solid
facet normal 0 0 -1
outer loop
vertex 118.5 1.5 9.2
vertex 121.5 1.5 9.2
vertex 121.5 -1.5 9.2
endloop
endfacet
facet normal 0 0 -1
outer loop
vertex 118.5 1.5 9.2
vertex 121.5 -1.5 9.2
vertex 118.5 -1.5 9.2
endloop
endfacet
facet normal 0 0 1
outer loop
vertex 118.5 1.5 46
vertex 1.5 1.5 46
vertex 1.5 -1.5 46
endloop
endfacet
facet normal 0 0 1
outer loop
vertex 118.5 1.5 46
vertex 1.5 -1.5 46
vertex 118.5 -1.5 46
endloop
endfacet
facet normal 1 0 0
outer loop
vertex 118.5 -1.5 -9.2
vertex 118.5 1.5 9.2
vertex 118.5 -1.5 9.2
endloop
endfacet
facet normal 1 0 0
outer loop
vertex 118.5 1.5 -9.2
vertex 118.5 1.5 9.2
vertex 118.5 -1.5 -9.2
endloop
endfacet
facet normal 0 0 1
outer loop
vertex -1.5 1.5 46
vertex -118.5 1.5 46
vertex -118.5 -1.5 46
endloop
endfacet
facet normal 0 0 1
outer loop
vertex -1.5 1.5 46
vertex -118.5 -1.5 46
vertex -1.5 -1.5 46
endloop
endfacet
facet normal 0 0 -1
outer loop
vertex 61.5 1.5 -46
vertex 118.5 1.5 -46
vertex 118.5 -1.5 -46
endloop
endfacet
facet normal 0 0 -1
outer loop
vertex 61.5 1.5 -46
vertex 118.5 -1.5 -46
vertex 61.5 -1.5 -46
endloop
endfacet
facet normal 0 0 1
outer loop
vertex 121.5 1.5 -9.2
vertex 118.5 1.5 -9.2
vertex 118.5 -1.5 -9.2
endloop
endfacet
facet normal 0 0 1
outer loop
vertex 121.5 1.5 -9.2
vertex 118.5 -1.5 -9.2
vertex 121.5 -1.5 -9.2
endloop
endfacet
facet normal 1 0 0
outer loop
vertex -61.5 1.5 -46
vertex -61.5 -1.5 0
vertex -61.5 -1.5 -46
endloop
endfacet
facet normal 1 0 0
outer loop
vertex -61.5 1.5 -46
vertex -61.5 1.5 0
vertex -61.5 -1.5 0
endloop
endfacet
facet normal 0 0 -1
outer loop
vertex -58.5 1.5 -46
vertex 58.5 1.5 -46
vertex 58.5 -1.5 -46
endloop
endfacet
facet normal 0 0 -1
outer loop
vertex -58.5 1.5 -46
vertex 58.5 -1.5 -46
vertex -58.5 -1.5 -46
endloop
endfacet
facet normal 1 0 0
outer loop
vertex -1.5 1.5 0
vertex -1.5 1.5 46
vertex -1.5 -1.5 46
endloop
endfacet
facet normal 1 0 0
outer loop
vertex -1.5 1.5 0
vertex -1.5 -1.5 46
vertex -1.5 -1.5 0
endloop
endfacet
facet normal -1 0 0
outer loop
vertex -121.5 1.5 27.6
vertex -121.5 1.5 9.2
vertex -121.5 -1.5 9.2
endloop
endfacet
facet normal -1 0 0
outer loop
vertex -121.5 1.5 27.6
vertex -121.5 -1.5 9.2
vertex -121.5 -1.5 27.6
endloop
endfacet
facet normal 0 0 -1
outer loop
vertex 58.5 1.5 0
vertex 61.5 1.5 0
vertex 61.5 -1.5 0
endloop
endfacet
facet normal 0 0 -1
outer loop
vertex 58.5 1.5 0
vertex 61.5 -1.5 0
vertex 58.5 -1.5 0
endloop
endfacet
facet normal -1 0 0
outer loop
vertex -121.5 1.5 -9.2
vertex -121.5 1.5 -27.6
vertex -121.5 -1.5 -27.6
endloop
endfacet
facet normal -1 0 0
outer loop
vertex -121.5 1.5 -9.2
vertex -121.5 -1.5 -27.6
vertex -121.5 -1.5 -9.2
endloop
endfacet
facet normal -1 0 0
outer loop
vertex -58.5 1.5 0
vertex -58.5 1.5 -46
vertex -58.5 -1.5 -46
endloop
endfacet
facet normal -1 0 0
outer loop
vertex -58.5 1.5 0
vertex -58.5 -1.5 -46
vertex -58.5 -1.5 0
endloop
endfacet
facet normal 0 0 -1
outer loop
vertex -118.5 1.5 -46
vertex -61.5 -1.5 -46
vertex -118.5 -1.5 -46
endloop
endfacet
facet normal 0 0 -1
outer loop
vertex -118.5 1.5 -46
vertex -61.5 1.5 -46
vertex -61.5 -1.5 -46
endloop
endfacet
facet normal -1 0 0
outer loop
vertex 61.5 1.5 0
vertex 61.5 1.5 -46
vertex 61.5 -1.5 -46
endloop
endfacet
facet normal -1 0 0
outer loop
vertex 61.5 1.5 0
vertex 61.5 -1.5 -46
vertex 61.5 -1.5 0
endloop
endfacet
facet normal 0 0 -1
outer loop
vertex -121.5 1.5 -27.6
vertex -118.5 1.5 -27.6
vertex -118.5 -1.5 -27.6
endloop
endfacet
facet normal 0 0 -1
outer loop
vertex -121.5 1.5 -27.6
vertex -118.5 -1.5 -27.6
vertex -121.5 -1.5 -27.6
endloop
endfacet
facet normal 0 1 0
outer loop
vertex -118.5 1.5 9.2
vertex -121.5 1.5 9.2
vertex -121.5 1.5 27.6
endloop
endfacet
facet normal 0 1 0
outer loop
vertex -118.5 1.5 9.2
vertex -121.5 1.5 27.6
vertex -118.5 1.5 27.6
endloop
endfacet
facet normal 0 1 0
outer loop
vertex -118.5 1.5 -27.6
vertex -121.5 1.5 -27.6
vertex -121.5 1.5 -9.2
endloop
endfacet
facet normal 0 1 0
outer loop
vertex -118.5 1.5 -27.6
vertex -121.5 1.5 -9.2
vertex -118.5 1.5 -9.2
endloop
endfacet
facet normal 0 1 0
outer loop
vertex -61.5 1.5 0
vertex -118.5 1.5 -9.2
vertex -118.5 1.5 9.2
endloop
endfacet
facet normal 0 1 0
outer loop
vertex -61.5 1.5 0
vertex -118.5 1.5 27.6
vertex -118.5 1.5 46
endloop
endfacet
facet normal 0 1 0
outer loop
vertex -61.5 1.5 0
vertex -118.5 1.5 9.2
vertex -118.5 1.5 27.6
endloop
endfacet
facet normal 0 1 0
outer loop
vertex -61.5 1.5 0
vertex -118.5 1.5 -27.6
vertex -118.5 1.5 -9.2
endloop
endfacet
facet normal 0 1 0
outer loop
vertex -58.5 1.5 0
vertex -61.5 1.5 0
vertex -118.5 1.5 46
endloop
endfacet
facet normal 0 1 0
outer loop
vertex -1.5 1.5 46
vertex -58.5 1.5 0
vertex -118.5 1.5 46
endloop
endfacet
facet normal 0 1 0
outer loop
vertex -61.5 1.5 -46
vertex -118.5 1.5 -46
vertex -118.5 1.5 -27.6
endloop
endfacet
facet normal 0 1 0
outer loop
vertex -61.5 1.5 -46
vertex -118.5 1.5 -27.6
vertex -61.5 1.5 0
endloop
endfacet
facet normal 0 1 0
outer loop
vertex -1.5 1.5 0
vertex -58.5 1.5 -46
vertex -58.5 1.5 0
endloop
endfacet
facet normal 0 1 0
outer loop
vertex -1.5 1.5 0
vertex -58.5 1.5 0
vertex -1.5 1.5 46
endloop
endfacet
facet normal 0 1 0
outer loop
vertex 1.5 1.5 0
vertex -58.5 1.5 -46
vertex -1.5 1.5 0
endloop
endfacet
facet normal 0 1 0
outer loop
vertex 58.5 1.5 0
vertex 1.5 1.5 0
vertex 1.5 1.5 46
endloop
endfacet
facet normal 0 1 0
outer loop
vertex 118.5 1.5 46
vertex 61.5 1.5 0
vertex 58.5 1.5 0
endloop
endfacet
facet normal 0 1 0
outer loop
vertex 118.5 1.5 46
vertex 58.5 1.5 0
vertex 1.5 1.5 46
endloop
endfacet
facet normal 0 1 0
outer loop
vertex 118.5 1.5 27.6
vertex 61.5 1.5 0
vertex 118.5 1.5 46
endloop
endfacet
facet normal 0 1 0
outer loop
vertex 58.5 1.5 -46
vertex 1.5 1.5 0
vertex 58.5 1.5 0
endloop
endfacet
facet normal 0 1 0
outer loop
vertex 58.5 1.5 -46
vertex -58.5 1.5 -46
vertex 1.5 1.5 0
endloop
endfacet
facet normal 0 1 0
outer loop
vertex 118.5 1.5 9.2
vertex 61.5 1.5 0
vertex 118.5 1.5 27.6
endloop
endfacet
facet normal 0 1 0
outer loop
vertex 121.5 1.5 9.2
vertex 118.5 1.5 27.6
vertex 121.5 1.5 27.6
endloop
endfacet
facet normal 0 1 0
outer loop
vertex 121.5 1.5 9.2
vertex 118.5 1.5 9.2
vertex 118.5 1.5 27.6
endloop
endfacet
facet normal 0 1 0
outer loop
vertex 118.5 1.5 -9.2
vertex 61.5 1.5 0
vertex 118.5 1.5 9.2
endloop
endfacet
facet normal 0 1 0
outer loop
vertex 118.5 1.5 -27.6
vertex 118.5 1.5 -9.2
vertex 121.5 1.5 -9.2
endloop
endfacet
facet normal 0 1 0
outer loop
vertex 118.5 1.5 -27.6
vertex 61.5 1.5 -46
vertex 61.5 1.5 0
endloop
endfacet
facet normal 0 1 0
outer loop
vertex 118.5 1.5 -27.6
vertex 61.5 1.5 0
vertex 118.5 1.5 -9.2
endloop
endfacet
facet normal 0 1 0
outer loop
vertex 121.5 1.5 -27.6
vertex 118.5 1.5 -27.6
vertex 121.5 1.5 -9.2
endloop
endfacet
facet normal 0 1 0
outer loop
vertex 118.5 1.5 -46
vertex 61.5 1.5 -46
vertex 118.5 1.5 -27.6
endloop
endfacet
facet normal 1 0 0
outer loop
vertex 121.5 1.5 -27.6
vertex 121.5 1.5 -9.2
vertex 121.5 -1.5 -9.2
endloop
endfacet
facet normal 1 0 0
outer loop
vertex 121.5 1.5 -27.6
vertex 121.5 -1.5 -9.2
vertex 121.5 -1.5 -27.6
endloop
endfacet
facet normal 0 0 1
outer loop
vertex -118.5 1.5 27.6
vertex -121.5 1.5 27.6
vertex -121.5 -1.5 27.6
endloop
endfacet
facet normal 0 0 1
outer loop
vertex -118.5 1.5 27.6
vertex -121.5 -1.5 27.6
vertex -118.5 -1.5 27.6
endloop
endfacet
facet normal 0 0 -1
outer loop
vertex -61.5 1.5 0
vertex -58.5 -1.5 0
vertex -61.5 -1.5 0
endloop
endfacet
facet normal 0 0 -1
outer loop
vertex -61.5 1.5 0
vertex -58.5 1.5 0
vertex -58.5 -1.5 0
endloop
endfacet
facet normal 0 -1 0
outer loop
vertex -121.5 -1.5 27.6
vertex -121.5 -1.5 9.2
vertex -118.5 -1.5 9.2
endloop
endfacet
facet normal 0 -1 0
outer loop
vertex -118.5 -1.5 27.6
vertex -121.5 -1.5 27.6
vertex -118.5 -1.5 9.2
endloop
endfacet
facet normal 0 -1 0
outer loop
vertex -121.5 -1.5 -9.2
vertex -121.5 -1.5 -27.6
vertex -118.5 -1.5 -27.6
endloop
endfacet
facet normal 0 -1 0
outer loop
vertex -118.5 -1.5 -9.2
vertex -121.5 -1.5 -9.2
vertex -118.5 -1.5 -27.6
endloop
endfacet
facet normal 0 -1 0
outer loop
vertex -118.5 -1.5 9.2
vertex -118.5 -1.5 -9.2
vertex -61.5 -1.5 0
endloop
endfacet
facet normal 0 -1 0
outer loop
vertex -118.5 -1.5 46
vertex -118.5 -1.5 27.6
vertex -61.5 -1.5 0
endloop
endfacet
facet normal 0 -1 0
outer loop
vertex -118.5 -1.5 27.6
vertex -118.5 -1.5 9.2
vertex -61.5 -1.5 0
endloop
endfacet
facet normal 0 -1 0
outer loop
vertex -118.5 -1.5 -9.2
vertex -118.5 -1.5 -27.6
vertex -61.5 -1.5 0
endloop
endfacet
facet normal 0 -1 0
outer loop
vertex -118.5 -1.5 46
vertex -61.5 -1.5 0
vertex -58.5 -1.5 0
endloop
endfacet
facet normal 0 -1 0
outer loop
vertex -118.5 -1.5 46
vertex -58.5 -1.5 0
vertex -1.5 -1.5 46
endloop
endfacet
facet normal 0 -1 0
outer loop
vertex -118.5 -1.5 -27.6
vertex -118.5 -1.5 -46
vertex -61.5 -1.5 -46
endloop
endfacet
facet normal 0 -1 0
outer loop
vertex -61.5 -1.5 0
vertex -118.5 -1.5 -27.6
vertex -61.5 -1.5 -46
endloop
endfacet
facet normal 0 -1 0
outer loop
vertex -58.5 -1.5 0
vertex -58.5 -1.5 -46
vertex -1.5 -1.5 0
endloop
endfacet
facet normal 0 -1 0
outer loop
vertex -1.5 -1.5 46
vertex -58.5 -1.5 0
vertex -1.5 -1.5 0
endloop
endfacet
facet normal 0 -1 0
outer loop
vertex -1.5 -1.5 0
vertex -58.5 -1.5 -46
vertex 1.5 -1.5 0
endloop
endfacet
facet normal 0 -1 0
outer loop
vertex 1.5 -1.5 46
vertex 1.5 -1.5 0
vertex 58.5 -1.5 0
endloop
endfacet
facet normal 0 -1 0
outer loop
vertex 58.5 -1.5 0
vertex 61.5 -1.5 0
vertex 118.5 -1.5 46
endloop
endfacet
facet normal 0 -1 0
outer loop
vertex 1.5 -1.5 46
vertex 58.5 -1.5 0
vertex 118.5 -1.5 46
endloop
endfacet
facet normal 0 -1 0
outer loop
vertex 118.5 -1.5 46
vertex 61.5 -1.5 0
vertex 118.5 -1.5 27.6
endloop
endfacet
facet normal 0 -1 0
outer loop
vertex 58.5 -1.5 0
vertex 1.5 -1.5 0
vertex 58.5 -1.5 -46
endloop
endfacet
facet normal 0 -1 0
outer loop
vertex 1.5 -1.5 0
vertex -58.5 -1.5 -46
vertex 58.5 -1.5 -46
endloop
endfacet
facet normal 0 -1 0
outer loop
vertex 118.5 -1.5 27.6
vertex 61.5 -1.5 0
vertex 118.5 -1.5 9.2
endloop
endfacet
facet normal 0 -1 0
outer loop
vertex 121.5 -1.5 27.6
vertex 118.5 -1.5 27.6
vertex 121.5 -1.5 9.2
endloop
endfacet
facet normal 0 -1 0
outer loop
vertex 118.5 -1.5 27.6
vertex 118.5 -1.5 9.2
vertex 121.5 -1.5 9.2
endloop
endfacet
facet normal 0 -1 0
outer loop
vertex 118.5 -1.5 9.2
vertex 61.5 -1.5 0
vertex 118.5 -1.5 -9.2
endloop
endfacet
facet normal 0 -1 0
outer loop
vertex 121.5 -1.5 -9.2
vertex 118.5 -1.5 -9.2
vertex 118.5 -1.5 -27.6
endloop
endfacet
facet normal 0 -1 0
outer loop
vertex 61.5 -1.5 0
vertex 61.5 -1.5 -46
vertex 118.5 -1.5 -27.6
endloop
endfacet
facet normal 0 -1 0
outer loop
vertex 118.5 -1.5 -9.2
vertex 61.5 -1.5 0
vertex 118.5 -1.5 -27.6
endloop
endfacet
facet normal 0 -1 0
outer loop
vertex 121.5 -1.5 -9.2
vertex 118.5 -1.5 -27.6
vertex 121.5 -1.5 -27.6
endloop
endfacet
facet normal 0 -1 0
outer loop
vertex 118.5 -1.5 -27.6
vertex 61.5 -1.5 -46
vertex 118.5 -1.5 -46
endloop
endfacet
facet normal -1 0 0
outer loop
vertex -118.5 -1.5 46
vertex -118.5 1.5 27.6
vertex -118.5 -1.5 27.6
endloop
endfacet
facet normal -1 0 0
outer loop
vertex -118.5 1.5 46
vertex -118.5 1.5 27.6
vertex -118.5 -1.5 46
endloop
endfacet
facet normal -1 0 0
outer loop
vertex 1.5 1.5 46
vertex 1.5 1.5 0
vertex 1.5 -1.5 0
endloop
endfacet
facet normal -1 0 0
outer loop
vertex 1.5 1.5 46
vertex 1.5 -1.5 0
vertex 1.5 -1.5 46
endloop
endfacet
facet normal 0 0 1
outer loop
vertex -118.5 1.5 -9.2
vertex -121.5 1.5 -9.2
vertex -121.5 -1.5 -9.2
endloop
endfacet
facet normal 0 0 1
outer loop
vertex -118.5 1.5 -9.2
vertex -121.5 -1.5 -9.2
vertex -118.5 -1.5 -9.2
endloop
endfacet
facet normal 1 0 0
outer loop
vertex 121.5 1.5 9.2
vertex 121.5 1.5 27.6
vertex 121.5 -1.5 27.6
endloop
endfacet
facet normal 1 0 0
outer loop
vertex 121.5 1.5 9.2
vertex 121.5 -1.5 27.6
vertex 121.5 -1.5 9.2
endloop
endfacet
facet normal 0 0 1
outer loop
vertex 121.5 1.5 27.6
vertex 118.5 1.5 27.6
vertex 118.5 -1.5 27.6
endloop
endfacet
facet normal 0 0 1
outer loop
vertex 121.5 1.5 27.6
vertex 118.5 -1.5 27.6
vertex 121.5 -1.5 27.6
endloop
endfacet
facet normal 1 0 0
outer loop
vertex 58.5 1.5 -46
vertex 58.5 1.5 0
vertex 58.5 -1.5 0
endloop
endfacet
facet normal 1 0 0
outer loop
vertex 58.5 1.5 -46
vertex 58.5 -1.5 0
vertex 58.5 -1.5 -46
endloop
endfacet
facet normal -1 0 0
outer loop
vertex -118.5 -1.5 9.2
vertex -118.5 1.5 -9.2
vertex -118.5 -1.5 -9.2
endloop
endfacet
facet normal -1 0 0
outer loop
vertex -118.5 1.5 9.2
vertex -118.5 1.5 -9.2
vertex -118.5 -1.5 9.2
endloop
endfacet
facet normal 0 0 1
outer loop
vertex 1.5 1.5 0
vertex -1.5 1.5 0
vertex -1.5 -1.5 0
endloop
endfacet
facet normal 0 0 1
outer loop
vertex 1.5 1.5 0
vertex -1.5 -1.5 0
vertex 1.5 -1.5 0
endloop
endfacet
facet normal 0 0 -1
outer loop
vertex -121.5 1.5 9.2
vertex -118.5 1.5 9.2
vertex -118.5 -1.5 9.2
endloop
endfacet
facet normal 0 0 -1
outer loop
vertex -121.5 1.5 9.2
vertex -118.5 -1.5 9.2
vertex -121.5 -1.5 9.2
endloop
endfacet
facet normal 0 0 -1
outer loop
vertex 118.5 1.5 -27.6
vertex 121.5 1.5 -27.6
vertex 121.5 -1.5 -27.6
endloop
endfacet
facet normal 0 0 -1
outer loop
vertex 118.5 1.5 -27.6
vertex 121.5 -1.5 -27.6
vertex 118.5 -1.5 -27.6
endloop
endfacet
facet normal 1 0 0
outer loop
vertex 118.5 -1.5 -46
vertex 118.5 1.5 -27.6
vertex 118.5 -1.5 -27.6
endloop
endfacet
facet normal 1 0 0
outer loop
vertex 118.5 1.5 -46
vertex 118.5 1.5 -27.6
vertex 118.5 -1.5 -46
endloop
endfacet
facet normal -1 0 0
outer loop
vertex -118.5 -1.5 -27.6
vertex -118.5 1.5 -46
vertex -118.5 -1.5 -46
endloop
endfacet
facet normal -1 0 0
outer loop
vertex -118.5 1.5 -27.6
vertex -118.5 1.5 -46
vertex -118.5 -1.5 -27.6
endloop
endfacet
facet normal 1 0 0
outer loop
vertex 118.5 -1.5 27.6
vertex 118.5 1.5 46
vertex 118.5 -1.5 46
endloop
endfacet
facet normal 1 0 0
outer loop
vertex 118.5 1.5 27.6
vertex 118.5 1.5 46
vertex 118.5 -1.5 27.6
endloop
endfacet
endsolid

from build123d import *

# Parameters (mm, degrees)
ESTRUSIONE_ESTRUSIONE1_DEPTH = 1.5


with BuildPart() as part:
    # Schizzo4 → Estrusione-Estrusione1 (new body, symmetric)
    with BuildSketch(Plane(origin=(0, 0, 0), x_dir=(1, 0, 0), z_dir=(0, 1, 0))):
        Polygon((-61.5, 46), (-118.5, 46), (-118.5, 27.6), (-121.5, 27.6), (-121.5, 9.2), (-118.5, 9.2), (-118.5, -9.2), (-121.5, -9.2), (-121.5, -27.6), (-118.5, -27.6), (-118.5, -46), (-1.5, -46), (-1.5, 0), (1.5, 0), (1.5, -46), (118.5, -46), (118.5, -27.6), (121.5, -27.6), (121.5, -9.2), (118.5, -9.2), (118.5, 9.2), (121.5, 9.2), (121.5, 27.6), (118.5, 27.6), (118.5, 46), (61.5, 46), (61.5, 0), (58.5, 0), (58.5, 46), (-58.5, 46), (-58.5, 0), (-61.5, 0), align=None)
    extrude(amount=ESTRUSIONE_ESTRUSIONE1_DEPTH, both=True)


solid = part.part
